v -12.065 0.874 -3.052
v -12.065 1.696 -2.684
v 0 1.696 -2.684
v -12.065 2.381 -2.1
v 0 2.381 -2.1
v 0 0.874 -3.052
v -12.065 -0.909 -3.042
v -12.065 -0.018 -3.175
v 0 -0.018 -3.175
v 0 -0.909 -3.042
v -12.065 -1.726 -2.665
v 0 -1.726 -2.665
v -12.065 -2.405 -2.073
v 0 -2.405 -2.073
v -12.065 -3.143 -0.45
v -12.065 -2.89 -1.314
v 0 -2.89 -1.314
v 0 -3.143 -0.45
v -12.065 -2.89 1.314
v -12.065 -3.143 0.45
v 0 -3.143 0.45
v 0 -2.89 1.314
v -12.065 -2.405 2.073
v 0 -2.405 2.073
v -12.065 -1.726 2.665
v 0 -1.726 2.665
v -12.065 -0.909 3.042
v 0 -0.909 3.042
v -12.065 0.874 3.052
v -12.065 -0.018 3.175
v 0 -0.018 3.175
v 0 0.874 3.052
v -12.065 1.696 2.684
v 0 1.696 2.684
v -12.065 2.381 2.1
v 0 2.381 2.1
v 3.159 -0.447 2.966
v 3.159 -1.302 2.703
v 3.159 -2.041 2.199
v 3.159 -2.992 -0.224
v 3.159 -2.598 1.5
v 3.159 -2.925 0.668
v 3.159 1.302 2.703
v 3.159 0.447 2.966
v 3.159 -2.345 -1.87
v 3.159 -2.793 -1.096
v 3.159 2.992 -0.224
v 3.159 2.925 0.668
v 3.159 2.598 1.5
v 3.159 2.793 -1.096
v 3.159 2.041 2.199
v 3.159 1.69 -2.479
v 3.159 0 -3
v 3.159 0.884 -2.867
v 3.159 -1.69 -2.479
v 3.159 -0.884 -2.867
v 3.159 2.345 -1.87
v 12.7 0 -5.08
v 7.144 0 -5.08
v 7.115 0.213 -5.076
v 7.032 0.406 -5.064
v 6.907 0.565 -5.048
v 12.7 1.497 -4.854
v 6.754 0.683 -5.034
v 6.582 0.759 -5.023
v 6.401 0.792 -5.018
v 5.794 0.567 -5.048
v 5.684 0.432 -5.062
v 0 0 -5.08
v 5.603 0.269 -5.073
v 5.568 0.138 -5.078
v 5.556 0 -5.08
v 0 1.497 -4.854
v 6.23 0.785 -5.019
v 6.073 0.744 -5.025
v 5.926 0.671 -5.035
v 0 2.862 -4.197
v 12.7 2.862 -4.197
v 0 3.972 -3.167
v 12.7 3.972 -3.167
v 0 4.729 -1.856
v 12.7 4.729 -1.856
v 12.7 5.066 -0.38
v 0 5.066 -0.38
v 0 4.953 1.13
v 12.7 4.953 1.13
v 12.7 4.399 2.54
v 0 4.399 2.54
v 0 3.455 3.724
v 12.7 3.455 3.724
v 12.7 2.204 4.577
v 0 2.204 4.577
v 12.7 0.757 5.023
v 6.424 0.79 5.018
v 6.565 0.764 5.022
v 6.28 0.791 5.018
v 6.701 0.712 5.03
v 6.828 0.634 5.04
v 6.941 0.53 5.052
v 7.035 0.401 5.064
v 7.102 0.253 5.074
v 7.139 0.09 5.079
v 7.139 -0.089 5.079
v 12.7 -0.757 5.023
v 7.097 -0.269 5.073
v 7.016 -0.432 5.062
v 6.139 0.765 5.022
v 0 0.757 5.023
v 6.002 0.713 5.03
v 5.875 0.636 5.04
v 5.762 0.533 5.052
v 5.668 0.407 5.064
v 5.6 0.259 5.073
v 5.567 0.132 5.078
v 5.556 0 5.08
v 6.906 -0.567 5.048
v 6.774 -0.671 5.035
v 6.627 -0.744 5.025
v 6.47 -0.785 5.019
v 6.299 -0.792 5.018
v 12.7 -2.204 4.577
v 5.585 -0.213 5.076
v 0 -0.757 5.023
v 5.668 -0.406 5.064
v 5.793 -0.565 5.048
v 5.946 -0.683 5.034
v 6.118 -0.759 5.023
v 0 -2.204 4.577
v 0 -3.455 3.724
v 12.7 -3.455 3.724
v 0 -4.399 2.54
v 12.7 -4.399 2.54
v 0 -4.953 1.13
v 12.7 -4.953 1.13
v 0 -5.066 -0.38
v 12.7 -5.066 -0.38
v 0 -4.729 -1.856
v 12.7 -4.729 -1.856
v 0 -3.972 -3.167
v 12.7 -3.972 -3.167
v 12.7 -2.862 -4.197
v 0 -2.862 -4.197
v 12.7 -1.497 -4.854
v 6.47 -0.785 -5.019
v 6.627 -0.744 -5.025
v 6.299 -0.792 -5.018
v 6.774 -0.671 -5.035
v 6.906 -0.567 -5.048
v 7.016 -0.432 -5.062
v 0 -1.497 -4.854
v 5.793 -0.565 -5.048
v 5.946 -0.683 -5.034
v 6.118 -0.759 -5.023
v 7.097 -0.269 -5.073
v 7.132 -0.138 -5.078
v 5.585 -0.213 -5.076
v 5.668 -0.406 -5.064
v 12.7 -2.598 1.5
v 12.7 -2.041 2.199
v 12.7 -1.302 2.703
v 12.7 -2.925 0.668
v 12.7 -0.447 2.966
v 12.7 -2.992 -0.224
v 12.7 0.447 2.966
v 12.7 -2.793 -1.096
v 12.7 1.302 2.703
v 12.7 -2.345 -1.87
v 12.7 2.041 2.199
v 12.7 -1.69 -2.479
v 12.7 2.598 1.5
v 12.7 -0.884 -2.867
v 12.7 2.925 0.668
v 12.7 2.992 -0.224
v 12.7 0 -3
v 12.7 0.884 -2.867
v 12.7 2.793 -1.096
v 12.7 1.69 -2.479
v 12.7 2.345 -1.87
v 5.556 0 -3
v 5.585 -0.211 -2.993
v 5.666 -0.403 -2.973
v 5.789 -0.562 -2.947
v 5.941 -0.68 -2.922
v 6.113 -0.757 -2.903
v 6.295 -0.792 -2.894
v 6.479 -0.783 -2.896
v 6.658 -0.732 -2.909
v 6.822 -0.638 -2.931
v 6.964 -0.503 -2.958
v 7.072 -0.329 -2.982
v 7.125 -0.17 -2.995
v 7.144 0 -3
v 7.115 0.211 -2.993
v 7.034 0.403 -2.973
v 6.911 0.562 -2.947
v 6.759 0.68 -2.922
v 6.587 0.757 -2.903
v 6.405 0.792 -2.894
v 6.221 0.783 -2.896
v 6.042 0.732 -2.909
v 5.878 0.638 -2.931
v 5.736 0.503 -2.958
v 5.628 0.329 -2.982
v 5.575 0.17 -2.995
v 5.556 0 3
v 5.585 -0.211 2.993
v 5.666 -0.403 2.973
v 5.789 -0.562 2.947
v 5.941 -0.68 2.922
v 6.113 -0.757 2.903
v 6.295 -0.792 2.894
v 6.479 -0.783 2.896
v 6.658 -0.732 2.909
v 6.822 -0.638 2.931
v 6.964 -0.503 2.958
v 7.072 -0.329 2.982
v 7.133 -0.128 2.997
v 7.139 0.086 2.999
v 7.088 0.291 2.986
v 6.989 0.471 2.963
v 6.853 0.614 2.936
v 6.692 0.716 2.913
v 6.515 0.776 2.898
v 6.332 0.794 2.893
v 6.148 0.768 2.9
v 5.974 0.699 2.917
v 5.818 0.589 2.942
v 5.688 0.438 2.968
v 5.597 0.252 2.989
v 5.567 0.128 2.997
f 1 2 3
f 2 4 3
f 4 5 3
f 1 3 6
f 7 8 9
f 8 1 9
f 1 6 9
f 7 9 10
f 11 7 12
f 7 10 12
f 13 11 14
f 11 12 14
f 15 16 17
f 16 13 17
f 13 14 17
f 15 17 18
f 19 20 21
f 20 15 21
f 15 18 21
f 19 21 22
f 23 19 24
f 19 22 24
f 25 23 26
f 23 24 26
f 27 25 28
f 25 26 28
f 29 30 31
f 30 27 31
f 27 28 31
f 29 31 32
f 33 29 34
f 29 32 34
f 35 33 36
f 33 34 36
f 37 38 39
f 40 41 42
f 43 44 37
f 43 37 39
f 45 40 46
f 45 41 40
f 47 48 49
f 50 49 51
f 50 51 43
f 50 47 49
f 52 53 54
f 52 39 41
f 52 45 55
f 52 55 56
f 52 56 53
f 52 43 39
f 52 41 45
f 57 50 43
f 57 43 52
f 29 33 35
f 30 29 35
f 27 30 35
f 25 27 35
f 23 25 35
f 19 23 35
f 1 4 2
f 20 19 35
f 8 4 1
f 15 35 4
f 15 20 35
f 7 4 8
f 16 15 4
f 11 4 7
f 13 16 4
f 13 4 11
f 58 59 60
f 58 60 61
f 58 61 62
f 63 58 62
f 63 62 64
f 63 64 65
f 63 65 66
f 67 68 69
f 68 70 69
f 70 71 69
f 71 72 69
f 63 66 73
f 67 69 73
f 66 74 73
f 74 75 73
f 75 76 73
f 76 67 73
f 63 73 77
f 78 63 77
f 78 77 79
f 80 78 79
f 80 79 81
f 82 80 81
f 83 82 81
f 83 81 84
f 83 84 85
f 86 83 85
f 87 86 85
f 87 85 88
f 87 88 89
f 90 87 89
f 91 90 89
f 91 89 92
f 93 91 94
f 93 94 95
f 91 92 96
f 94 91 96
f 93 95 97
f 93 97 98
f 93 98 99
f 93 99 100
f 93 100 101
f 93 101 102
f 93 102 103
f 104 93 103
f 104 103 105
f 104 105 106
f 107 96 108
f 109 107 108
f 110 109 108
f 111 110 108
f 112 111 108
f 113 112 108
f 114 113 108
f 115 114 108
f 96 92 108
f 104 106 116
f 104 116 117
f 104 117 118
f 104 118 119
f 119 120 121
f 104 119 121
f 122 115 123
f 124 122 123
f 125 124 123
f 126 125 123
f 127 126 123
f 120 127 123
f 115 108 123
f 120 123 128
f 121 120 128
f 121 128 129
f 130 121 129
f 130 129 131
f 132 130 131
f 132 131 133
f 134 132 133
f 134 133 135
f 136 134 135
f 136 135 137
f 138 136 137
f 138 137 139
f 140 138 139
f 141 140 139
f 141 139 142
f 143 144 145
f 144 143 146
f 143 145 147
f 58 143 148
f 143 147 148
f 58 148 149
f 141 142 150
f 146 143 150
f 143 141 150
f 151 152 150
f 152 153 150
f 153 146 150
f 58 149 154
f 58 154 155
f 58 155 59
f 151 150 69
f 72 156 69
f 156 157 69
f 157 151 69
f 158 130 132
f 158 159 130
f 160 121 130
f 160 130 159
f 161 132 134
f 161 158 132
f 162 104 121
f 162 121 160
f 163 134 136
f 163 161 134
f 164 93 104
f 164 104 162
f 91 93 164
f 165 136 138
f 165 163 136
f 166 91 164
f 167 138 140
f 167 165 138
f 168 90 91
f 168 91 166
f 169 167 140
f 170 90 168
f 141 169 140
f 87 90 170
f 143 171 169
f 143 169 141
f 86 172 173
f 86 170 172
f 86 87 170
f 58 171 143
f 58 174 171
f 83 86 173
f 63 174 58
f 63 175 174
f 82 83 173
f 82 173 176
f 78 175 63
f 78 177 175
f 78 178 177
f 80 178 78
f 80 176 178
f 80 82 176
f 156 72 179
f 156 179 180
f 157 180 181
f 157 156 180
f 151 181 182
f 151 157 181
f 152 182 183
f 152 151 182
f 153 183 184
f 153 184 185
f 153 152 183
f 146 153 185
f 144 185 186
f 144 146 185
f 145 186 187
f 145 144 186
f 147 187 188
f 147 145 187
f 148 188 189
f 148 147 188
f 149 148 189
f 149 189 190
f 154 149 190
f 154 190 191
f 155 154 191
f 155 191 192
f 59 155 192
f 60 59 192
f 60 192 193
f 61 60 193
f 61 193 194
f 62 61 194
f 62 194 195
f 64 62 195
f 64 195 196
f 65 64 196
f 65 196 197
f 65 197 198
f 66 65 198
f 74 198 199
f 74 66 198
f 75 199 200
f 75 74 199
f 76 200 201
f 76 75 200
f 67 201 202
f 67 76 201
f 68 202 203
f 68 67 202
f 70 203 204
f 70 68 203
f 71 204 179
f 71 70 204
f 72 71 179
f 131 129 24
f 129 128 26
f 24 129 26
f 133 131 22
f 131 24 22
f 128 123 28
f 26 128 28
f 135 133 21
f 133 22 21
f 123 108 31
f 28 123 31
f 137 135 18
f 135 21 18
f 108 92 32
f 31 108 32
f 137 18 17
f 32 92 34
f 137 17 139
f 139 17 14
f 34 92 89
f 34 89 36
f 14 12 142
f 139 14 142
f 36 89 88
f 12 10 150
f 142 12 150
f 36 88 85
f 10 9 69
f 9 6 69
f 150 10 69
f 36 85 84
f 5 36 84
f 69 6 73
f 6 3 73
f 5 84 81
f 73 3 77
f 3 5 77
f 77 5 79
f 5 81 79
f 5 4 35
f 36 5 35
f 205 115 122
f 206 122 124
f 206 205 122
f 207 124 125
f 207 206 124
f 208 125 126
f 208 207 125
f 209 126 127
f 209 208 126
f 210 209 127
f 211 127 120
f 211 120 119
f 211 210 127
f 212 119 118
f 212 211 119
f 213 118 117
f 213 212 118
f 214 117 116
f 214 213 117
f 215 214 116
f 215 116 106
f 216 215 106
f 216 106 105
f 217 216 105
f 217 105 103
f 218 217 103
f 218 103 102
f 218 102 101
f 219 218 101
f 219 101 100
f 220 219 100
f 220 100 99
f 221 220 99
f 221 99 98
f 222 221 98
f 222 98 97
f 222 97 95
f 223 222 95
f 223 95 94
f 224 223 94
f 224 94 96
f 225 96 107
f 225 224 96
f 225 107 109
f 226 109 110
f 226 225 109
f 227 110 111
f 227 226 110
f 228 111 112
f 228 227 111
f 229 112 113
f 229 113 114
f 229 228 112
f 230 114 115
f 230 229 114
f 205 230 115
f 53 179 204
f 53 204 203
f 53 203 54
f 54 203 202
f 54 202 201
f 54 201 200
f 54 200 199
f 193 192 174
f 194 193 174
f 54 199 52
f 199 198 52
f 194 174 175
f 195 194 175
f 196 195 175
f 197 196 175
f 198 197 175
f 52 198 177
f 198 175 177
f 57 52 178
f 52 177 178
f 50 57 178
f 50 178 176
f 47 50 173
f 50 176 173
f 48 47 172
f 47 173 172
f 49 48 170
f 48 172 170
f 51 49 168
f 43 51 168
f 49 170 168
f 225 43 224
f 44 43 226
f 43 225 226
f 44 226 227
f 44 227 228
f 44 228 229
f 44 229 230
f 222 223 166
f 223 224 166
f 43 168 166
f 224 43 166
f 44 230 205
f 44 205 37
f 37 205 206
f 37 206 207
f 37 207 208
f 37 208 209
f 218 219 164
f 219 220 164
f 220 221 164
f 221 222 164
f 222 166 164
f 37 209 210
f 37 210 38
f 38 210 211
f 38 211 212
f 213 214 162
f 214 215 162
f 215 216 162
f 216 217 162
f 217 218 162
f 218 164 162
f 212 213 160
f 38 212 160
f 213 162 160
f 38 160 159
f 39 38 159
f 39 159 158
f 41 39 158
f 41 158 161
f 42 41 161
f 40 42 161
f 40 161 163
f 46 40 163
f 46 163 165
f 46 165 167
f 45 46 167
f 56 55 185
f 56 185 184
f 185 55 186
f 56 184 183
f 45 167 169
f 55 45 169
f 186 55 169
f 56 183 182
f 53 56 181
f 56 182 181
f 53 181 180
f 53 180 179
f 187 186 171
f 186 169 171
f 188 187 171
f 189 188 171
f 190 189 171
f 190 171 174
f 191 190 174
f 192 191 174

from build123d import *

# Parameters (mm, degrees)
SKETCH1_R               = 5.08
BOSS_EXTRUDE1_DEPTH     = 12.7
SKETCH2_R               = 2.999994
CUT_EXTRUDE1_DEPTH      = 9.541256
SKETCH3_R               = 3.175
BOSS_EXTRUDE2_DEPTH     = 12.065
CUT_EXTRUDE2_DEPTH      = 7.62
CUT_EXTRUDE2_DEPTH_BACK = 7.62
SKETCH4_R               = 0.79375
SKETCH7_W               = 0.79375
SKETCH7_H               = 4.200130206
CUT_EXTRUDE3_DEPTH      = 12.065


with BuildPart() as part:
    # Sketch1 → Boss-Extrude1 (new body)
    with BuildSketch(Plane.YZ):
        Circle(SKETCH1_R)
    extrude(amount=BOSS_EXTRUDE1_DEPTH)

    # Sketch2 → Cut-Extrude1 (cut)
    with BuildSketch(Plane.YZ.offset(12.7)):
        Circle(SKETCH2_R)
    extrude(amount=-CUT_EXTRUDE1_DEPTH, mode=Mode.SUBTRACT)

    # Sketch3 → Boss-Extrude2 (add)
    with BuildSketch(Plane(origin=(0, 0, 0), x_dir=(0, -1, 0), z_dir=(-1, 0, 0))):
        Circle(SKETCH3_R)
    extrude(amount=BOSS_EXTRUDE2_DEPTH)

    # Sketch4 → Cut-Extrude2 (cut, two sides: drawn at the far end of the back side and taken through both)
    with BuildSketch(Plane(origin=(0, 0, 0), x_dir=(0, 1, 0), z_dir=(0, 0, 1)).offset(-CUT_EXTRUDE2_DEPTH_BACK)):
        with Locations((0, -6.35)):
            Circle(SKETCH4_R)
    extrude(amount=CUT_EXTRUDE2_DEPTH + CUT_EXTRUDE2_DEPTH_BACK, mode=Mode.SUBTRACT)

    # Sketch7 → Cut-Extrude3 (cut)
    with BuildSketch(Plane(origin=(-12.065, 0, 0), x_dir=(0, -1, 0), z_dir=(-1, 0, 0))):
        with Locations((-2.778125, 0)):
            Rectangle(SKETCH7_W, SKETCH7_H)
    extrude(amount=-CUT_EXTRUDE3_DEPTH, mode=Mode.SUBTRACT)


solid = part.part
